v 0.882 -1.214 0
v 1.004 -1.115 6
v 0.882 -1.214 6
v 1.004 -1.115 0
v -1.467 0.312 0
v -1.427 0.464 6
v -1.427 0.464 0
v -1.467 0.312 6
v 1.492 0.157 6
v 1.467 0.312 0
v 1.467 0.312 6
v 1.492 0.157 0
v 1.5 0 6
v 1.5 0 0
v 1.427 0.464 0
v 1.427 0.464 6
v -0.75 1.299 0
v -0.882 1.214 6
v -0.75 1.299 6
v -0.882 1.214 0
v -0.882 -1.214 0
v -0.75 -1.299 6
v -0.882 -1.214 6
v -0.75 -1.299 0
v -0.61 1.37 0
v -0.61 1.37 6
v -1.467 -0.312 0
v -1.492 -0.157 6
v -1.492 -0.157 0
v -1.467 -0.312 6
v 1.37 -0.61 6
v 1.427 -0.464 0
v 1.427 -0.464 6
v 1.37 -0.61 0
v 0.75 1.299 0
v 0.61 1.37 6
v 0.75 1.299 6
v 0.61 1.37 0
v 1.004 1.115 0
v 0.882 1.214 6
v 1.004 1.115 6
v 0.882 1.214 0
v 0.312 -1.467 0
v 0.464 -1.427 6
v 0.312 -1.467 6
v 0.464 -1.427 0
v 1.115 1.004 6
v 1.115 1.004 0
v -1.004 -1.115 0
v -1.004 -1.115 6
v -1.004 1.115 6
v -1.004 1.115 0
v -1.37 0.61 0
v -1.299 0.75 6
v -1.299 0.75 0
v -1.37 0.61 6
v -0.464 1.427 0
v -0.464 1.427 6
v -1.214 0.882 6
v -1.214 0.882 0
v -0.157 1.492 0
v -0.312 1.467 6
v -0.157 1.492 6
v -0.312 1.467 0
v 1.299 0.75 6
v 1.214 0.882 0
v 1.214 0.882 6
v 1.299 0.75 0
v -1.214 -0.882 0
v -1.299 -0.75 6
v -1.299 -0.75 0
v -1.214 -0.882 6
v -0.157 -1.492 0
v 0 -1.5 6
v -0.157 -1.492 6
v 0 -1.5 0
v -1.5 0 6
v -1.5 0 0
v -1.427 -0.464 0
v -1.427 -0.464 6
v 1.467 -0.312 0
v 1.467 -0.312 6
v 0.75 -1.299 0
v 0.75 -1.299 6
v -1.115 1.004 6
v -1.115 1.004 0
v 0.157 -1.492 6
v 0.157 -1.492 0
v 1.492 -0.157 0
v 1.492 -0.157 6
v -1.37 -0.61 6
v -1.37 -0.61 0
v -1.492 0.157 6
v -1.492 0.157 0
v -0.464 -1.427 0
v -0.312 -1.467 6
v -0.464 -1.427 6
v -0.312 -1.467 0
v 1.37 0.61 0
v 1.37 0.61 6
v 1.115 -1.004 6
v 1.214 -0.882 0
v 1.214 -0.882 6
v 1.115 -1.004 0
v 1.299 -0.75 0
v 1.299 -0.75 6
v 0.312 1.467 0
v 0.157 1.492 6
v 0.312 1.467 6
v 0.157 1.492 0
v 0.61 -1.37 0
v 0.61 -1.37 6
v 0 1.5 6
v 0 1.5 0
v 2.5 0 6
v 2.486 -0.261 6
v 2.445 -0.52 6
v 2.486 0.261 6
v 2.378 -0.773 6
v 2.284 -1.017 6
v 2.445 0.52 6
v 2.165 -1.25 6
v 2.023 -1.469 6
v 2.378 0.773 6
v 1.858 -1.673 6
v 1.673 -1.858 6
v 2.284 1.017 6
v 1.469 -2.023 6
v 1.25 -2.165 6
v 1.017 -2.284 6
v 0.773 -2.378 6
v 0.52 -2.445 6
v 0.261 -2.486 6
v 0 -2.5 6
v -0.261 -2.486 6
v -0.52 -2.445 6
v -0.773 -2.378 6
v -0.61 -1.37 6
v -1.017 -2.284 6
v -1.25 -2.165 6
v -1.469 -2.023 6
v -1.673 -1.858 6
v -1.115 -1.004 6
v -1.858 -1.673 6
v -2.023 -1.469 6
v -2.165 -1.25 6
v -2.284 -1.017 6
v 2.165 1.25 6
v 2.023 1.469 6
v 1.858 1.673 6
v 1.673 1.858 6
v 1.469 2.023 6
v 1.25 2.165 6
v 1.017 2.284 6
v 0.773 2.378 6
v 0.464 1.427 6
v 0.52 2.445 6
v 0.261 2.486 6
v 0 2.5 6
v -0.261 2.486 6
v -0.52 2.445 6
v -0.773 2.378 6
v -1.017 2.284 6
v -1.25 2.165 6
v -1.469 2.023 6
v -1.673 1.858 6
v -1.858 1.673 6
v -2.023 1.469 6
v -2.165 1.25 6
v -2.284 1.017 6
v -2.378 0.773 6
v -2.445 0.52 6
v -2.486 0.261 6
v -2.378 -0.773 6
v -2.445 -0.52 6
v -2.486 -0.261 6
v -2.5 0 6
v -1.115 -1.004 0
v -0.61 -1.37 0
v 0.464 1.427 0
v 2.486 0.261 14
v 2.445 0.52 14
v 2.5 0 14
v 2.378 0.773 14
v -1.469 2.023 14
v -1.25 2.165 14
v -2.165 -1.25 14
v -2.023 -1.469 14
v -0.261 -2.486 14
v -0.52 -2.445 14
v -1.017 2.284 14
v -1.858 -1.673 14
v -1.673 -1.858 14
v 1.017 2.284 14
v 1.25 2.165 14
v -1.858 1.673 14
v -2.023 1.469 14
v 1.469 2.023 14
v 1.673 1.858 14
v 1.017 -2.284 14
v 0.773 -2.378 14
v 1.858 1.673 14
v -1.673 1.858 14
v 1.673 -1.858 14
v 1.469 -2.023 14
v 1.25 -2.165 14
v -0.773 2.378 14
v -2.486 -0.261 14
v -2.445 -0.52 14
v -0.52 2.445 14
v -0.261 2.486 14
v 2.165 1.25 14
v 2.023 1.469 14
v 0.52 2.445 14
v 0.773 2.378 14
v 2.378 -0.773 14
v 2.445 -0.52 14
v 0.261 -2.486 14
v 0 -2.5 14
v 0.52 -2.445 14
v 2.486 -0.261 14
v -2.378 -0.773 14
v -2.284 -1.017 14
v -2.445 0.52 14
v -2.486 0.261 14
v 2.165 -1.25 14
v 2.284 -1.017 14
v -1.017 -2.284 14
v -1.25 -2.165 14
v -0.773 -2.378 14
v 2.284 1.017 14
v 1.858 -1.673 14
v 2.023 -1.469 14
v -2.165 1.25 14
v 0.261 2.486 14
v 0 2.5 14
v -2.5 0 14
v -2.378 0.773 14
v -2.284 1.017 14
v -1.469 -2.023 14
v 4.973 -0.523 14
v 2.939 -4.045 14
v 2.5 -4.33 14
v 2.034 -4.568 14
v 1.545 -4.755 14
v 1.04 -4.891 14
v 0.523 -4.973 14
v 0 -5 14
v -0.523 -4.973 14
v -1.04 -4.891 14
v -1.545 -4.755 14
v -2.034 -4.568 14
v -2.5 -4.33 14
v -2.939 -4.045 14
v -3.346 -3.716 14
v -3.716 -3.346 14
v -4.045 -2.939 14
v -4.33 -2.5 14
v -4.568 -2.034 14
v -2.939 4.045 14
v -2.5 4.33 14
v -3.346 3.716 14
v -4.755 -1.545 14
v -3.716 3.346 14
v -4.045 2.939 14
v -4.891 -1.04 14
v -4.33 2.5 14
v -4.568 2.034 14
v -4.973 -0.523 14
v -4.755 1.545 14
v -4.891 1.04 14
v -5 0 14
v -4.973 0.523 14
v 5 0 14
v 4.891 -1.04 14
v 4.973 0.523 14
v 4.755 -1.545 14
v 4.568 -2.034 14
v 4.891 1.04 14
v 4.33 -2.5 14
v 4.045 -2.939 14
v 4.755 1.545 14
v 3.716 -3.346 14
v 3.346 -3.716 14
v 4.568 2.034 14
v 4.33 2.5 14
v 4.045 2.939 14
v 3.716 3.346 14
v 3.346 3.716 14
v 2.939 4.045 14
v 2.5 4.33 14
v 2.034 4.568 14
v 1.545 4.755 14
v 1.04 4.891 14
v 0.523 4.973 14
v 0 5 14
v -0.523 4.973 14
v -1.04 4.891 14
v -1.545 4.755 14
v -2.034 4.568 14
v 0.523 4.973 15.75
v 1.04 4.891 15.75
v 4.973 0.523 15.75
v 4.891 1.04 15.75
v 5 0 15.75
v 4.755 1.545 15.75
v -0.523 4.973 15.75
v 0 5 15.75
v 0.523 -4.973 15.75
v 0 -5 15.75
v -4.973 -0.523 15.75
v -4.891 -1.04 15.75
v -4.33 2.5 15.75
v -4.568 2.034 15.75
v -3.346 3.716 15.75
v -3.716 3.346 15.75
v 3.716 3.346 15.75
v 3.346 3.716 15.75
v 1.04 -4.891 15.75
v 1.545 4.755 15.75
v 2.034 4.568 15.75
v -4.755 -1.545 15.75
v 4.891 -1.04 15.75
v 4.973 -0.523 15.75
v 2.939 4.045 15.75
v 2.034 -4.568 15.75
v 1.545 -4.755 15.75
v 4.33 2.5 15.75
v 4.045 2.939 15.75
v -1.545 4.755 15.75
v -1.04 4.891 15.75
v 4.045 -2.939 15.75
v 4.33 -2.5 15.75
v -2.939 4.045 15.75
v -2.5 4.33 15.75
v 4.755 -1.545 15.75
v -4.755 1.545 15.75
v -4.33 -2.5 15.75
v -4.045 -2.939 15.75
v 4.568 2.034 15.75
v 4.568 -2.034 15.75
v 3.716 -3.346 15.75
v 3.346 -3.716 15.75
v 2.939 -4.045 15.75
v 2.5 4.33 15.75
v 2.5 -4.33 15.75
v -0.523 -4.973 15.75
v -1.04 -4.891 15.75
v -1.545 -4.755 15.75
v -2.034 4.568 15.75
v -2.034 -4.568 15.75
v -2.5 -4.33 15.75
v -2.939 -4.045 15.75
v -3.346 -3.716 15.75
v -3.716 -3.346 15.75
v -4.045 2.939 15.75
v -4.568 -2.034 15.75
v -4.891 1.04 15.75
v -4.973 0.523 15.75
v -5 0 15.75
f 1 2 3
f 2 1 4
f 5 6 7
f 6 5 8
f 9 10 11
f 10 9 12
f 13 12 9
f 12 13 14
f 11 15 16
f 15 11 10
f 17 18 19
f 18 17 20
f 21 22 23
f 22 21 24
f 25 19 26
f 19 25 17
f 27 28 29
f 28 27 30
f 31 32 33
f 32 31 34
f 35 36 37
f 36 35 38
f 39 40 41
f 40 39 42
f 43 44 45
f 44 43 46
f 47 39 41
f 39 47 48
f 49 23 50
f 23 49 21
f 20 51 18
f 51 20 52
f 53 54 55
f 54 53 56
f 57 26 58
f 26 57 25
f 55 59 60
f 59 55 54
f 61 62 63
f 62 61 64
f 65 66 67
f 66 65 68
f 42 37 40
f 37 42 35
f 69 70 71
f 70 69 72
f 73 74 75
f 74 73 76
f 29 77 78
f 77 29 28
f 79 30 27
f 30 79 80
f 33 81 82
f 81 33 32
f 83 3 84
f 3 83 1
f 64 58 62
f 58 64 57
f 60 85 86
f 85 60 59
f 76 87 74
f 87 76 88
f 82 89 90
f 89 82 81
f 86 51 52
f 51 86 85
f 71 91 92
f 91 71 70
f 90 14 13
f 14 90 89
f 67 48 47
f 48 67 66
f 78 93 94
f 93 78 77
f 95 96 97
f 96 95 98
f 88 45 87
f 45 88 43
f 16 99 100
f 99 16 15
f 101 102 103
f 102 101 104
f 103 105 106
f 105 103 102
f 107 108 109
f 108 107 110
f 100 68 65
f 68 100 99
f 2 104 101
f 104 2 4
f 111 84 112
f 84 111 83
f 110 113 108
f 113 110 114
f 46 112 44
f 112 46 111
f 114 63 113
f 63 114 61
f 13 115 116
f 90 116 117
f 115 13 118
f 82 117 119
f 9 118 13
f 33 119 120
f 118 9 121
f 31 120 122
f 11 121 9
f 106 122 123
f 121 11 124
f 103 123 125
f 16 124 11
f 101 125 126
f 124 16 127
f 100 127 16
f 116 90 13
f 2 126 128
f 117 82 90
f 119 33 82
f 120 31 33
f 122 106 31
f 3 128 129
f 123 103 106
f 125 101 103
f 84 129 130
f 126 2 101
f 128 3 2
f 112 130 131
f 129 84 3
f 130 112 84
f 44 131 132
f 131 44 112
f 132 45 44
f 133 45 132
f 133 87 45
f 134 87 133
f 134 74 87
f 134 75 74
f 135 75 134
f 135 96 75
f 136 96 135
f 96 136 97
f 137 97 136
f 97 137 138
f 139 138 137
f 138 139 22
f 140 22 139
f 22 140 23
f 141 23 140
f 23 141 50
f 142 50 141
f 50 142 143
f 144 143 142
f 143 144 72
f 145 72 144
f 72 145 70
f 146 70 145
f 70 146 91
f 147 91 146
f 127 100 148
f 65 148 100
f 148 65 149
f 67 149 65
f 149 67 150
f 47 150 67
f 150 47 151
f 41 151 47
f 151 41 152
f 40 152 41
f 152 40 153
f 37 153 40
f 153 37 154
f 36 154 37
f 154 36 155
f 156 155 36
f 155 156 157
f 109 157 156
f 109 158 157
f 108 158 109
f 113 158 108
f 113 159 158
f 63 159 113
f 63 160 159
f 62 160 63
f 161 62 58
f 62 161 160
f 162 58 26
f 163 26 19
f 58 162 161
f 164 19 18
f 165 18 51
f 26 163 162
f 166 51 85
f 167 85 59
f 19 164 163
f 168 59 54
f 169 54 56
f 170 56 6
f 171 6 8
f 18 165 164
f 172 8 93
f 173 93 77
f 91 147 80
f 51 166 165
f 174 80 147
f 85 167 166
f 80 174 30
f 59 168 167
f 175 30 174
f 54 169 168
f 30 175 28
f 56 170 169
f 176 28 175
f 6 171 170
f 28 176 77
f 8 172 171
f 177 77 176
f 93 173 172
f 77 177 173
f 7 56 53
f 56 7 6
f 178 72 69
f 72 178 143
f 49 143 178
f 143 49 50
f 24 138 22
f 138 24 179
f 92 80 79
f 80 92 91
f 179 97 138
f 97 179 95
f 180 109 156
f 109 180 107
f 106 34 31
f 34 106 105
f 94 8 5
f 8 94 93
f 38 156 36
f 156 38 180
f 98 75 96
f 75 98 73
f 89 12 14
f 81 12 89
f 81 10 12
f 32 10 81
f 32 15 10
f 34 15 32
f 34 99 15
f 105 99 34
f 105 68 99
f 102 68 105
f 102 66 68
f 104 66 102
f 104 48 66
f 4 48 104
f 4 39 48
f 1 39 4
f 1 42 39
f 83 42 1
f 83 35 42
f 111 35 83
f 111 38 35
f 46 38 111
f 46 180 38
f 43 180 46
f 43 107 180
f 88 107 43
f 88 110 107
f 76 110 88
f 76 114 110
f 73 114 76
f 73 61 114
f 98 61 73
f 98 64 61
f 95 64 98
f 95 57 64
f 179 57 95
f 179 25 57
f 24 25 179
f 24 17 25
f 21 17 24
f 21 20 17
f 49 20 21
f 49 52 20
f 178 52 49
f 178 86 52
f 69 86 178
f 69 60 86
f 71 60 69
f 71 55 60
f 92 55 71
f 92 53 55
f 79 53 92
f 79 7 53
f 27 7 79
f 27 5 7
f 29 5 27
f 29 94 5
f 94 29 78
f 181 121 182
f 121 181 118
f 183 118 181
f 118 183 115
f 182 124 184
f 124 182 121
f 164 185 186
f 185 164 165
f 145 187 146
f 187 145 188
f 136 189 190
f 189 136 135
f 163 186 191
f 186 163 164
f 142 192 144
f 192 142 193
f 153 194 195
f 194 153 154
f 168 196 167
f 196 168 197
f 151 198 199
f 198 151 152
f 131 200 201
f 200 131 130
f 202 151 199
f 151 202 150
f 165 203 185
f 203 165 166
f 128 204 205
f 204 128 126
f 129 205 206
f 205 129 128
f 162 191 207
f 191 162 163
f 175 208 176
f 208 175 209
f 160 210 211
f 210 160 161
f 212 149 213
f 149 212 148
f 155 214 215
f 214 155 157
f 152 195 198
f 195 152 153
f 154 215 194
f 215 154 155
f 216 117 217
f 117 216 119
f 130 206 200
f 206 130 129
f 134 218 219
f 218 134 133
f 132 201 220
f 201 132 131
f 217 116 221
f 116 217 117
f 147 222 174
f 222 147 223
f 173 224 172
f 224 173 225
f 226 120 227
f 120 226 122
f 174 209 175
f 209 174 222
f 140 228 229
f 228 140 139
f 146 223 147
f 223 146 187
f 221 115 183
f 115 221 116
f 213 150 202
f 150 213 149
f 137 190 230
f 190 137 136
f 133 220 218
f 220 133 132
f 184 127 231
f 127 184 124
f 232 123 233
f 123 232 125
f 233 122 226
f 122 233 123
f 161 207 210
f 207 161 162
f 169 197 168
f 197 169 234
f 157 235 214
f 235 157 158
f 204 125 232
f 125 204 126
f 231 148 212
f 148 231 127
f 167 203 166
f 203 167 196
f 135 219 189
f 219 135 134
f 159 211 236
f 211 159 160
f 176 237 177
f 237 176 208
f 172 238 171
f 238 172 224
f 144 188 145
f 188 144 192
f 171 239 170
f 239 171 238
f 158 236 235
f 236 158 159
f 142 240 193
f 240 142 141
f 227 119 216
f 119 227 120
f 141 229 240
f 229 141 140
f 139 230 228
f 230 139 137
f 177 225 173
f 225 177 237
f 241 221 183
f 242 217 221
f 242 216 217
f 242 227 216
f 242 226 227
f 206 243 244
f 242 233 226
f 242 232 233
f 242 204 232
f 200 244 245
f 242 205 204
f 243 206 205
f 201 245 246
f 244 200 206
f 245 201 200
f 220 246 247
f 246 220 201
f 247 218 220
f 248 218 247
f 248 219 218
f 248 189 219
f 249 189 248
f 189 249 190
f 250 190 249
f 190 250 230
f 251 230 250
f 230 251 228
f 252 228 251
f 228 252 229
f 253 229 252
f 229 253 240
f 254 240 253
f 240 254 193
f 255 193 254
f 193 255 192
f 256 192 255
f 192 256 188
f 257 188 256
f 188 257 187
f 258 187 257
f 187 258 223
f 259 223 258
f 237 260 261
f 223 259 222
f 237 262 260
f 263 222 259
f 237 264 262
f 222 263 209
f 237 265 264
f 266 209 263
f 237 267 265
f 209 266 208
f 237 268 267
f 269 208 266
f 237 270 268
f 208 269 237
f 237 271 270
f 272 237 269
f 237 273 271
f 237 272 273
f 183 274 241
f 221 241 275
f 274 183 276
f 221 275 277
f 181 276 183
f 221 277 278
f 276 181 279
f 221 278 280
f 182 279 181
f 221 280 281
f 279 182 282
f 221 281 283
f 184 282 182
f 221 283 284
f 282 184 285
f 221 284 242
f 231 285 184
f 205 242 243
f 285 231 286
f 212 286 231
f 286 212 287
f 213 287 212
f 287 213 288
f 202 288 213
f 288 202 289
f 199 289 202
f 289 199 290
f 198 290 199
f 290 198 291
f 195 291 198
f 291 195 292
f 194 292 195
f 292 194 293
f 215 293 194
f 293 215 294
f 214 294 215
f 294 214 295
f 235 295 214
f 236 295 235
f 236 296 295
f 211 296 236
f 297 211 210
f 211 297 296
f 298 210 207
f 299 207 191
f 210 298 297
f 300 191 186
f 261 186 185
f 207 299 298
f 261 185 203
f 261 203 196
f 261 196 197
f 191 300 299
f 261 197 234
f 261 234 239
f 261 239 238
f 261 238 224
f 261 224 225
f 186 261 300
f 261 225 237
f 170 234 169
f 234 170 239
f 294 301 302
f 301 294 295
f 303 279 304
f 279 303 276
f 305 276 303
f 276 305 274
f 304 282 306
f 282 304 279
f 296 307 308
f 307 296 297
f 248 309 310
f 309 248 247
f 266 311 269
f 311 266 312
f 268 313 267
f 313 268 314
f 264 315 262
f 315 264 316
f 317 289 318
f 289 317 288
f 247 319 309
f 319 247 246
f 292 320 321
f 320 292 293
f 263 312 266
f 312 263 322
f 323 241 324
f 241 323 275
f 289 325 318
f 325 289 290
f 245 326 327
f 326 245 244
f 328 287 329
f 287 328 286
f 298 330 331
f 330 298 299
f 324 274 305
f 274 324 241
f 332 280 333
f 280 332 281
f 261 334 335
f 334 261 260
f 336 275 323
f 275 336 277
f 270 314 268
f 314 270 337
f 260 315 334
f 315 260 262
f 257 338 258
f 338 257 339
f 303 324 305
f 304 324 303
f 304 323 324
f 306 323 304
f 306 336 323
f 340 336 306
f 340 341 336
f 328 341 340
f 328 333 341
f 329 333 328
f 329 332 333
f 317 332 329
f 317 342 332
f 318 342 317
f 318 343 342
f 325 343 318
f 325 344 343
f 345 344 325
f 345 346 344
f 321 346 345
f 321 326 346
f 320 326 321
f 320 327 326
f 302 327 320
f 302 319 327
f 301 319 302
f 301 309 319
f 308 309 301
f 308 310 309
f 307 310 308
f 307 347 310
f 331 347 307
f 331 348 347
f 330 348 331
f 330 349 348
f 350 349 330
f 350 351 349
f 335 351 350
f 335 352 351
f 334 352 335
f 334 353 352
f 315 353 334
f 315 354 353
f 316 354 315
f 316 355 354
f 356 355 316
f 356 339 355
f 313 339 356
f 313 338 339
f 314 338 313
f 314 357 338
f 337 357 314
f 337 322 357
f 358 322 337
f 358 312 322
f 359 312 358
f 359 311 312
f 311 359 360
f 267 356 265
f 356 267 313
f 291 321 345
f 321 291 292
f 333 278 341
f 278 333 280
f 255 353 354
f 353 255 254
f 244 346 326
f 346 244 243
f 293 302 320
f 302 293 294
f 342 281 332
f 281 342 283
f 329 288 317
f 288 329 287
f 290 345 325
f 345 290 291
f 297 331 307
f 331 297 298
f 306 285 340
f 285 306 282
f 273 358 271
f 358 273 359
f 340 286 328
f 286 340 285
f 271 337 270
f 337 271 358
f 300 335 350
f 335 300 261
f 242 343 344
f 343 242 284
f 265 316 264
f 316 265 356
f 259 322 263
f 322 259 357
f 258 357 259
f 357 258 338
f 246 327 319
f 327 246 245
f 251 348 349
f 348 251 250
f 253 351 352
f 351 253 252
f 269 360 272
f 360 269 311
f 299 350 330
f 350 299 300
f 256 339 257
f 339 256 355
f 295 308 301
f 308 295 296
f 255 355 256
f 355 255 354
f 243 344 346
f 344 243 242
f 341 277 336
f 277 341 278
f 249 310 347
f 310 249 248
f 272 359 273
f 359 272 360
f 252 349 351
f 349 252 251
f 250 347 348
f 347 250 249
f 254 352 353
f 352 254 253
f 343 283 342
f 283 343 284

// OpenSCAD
// Shoulder bolt.
$fn = 60;
eps = 0.02;
thread_d = 3;
shoulder_d = 5;
shoulder_l = 8;
thread_l = 6;
head_d = shoulder_d + 5;
union() {
    cylinder(d=thread_d,h=thread_l);
    translate([0,0,thread_l]) cylinder(d=shoulder_d,h=shoulder_l);
    translate([0,0,thread_l+shoulder_l]) cylinder(d=head_d,h=shoulder_d*0.35);
}
